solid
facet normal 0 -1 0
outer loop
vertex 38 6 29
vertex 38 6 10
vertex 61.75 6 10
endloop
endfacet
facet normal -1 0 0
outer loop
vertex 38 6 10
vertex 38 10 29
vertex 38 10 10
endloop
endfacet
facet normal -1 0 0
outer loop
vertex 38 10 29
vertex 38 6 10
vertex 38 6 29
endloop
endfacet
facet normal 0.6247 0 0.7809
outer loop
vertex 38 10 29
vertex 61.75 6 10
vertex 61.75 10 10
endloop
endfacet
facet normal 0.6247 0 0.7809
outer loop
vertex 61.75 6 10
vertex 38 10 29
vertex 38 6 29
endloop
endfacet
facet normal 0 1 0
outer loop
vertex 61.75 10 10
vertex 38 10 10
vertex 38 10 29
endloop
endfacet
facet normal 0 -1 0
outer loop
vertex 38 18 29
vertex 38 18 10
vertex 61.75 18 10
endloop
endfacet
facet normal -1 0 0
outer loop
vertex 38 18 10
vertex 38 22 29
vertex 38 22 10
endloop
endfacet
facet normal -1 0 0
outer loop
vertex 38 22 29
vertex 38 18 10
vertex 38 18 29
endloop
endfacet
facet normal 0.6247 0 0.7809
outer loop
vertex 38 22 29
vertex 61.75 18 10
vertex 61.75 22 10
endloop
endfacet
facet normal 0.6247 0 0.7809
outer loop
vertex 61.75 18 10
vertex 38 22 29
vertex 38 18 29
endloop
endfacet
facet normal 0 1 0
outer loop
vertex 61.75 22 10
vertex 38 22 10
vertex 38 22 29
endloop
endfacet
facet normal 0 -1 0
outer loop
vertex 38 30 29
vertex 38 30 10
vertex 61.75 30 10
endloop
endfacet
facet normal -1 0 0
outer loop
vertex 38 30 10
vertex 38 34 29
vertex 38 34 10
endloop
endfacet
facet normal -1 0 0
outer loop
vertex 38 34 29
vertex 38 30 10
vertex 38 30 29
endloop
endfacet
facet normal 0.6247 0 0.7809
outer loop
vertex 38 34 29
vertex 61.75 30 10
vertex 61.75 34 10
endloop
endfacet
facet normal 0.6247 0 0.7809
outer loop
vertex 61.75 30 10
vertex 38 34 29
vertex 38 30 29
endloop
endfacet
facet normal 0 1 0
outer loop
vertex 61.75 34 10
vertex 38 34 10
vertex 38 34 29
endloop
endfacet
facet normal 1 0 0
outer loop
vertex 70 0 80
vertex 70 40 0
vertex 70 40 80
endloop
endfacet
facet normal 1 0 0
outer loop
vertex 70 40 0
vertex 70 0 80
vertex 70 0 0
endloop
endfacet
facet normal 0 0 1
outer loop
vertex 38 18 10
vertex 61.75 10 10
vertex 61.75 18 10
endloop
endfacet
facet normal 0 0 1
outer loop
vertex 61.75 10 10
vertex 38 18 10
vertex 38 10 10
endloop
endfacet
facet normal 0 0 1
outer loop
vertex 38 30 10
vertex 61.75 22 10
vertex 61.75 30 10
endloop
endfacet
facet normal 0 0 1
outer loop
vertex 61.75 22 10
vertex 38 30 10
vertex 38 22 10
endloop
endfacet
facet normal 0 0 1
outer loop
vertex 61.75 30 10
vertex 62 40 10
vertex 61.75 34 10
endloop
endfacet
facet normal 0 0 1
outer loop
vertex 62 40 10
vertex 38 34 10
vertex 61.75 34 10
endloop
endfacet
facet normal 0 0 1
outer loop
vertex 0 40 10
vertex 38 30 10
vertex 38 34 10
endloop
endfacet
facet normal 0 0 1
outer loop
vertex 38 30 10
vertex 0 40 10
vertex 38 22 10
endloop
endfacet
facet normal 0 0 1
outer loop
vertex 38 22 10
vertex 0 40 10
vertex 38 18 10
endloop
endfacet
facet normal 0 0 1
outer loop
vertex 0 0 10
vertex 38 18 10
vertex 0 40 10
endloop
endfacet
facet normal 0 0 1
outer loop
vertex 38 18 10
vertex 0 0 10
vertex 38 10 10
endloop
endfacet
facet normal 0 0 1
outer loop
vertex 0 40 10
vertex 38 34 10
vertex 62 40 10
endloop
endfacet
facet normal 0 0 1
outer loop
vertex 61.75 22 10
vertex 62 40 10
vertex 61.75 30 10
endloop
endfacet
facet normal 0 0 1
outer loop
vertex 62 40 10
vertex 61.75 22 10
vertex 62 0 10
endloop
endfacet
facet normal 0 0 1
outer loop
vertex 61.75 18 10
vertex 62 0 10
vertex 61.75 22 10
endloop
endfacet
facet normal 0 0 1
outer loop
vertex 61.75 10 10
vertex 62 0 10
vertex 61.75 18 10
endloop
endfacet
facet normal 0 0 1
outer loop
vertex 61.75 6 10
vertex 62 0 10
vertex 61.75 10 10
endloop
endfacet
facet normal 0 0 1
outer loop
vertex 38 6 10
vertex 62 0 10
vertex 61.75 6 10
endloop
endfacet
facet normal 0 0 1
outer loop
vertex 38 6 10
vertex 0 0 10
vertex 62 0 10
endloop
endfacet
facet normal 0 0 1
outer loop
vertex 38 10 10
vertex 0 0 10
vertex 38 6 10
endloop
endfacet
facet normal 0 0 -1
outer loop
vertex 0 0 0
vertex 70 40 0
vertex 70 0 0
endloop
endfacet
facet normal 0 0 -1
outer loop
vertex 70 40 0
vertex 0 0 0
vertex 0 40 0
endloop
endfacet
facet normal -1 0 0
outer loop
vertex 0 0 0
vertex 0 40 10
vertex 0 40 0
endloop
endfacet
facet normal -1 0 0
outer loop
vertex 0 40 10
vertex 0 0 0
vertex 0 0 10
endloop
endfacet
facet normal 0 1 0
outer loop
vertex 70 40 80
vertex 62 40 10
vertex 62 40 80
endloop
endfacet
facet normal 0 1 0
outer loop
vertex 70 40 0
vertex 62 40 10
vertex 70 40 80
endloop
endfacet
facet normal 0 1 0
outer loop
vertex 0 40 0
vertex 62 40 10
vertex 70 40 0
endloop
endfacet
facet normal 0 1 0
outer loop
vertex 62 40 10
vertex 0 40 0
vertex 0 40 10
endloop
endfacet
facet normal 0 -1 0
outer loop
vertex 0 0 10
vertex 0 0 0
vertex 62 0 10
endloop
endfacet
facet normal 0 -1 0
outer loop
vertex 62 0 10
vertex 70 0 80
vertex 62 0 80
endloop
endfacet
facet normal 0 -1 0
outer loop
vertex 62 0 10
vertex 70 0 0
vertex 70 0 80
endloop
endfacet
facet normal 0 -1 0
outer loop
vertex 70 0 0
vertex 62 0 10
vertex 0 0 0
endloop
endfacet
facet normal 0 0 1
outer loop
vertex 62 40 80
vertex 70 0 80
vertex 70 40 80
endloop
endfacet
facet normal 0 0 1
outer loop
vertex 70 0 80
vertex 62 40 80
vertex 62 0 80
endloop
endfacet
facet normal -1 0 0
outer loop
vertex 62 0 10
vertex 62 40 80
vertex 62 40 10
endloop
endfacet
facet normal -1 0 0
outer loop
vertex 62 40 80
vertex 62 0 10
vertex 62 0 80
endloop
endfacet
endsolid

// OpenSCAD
$fn = 32;

// ----------------------------------------------------------------------
// Rib bracket: 3-gusset L bracket
// ----------------------------------------------------------------------

// --- parameters (mm) ---
base_l = 70;              // foot length, X
base_w = 40;              // foot width, Y
base_t = 10;              // foot thickness
plate_t = 8;              // upright plate thickness
plate_h = 80;             // overall height
gus_l = 24;               // gusset leg along the foot
gus_h = 20;               // gusset height
gus_t = 4;                // gusset thickness
gus_edge = 6;             // gusset margin from the foot edge
n_gus = 3;                // gusset count
fit_tol = 0.1;            // tolerance for press fits, mm
free_tol = 0.3;           // tolerance for clearance fits, mm

gus_pitch = (base_w - 2 * gus_edge - gus_t) / (n_gus - 1);  // gusset pitch

union() {
  cube([base_l, base_w, base_t]);
  translate([base_l - plate_t, 0, base_t - 1])
    cube([plate_t, base_w, plate_h - base_t + 1]);
  for (i = [0 : n_gus - 1])
    translate([base_l - plate_t - gus_l, gus_edge + i * gus_pitch, base_t - 1])
      rotate([-90, 0, 0])
        linear_extrude(height = gus_t)
          polygon(points = [[0, 0], [gus_l + 1, 0], [0, -gus_h]]);
}
